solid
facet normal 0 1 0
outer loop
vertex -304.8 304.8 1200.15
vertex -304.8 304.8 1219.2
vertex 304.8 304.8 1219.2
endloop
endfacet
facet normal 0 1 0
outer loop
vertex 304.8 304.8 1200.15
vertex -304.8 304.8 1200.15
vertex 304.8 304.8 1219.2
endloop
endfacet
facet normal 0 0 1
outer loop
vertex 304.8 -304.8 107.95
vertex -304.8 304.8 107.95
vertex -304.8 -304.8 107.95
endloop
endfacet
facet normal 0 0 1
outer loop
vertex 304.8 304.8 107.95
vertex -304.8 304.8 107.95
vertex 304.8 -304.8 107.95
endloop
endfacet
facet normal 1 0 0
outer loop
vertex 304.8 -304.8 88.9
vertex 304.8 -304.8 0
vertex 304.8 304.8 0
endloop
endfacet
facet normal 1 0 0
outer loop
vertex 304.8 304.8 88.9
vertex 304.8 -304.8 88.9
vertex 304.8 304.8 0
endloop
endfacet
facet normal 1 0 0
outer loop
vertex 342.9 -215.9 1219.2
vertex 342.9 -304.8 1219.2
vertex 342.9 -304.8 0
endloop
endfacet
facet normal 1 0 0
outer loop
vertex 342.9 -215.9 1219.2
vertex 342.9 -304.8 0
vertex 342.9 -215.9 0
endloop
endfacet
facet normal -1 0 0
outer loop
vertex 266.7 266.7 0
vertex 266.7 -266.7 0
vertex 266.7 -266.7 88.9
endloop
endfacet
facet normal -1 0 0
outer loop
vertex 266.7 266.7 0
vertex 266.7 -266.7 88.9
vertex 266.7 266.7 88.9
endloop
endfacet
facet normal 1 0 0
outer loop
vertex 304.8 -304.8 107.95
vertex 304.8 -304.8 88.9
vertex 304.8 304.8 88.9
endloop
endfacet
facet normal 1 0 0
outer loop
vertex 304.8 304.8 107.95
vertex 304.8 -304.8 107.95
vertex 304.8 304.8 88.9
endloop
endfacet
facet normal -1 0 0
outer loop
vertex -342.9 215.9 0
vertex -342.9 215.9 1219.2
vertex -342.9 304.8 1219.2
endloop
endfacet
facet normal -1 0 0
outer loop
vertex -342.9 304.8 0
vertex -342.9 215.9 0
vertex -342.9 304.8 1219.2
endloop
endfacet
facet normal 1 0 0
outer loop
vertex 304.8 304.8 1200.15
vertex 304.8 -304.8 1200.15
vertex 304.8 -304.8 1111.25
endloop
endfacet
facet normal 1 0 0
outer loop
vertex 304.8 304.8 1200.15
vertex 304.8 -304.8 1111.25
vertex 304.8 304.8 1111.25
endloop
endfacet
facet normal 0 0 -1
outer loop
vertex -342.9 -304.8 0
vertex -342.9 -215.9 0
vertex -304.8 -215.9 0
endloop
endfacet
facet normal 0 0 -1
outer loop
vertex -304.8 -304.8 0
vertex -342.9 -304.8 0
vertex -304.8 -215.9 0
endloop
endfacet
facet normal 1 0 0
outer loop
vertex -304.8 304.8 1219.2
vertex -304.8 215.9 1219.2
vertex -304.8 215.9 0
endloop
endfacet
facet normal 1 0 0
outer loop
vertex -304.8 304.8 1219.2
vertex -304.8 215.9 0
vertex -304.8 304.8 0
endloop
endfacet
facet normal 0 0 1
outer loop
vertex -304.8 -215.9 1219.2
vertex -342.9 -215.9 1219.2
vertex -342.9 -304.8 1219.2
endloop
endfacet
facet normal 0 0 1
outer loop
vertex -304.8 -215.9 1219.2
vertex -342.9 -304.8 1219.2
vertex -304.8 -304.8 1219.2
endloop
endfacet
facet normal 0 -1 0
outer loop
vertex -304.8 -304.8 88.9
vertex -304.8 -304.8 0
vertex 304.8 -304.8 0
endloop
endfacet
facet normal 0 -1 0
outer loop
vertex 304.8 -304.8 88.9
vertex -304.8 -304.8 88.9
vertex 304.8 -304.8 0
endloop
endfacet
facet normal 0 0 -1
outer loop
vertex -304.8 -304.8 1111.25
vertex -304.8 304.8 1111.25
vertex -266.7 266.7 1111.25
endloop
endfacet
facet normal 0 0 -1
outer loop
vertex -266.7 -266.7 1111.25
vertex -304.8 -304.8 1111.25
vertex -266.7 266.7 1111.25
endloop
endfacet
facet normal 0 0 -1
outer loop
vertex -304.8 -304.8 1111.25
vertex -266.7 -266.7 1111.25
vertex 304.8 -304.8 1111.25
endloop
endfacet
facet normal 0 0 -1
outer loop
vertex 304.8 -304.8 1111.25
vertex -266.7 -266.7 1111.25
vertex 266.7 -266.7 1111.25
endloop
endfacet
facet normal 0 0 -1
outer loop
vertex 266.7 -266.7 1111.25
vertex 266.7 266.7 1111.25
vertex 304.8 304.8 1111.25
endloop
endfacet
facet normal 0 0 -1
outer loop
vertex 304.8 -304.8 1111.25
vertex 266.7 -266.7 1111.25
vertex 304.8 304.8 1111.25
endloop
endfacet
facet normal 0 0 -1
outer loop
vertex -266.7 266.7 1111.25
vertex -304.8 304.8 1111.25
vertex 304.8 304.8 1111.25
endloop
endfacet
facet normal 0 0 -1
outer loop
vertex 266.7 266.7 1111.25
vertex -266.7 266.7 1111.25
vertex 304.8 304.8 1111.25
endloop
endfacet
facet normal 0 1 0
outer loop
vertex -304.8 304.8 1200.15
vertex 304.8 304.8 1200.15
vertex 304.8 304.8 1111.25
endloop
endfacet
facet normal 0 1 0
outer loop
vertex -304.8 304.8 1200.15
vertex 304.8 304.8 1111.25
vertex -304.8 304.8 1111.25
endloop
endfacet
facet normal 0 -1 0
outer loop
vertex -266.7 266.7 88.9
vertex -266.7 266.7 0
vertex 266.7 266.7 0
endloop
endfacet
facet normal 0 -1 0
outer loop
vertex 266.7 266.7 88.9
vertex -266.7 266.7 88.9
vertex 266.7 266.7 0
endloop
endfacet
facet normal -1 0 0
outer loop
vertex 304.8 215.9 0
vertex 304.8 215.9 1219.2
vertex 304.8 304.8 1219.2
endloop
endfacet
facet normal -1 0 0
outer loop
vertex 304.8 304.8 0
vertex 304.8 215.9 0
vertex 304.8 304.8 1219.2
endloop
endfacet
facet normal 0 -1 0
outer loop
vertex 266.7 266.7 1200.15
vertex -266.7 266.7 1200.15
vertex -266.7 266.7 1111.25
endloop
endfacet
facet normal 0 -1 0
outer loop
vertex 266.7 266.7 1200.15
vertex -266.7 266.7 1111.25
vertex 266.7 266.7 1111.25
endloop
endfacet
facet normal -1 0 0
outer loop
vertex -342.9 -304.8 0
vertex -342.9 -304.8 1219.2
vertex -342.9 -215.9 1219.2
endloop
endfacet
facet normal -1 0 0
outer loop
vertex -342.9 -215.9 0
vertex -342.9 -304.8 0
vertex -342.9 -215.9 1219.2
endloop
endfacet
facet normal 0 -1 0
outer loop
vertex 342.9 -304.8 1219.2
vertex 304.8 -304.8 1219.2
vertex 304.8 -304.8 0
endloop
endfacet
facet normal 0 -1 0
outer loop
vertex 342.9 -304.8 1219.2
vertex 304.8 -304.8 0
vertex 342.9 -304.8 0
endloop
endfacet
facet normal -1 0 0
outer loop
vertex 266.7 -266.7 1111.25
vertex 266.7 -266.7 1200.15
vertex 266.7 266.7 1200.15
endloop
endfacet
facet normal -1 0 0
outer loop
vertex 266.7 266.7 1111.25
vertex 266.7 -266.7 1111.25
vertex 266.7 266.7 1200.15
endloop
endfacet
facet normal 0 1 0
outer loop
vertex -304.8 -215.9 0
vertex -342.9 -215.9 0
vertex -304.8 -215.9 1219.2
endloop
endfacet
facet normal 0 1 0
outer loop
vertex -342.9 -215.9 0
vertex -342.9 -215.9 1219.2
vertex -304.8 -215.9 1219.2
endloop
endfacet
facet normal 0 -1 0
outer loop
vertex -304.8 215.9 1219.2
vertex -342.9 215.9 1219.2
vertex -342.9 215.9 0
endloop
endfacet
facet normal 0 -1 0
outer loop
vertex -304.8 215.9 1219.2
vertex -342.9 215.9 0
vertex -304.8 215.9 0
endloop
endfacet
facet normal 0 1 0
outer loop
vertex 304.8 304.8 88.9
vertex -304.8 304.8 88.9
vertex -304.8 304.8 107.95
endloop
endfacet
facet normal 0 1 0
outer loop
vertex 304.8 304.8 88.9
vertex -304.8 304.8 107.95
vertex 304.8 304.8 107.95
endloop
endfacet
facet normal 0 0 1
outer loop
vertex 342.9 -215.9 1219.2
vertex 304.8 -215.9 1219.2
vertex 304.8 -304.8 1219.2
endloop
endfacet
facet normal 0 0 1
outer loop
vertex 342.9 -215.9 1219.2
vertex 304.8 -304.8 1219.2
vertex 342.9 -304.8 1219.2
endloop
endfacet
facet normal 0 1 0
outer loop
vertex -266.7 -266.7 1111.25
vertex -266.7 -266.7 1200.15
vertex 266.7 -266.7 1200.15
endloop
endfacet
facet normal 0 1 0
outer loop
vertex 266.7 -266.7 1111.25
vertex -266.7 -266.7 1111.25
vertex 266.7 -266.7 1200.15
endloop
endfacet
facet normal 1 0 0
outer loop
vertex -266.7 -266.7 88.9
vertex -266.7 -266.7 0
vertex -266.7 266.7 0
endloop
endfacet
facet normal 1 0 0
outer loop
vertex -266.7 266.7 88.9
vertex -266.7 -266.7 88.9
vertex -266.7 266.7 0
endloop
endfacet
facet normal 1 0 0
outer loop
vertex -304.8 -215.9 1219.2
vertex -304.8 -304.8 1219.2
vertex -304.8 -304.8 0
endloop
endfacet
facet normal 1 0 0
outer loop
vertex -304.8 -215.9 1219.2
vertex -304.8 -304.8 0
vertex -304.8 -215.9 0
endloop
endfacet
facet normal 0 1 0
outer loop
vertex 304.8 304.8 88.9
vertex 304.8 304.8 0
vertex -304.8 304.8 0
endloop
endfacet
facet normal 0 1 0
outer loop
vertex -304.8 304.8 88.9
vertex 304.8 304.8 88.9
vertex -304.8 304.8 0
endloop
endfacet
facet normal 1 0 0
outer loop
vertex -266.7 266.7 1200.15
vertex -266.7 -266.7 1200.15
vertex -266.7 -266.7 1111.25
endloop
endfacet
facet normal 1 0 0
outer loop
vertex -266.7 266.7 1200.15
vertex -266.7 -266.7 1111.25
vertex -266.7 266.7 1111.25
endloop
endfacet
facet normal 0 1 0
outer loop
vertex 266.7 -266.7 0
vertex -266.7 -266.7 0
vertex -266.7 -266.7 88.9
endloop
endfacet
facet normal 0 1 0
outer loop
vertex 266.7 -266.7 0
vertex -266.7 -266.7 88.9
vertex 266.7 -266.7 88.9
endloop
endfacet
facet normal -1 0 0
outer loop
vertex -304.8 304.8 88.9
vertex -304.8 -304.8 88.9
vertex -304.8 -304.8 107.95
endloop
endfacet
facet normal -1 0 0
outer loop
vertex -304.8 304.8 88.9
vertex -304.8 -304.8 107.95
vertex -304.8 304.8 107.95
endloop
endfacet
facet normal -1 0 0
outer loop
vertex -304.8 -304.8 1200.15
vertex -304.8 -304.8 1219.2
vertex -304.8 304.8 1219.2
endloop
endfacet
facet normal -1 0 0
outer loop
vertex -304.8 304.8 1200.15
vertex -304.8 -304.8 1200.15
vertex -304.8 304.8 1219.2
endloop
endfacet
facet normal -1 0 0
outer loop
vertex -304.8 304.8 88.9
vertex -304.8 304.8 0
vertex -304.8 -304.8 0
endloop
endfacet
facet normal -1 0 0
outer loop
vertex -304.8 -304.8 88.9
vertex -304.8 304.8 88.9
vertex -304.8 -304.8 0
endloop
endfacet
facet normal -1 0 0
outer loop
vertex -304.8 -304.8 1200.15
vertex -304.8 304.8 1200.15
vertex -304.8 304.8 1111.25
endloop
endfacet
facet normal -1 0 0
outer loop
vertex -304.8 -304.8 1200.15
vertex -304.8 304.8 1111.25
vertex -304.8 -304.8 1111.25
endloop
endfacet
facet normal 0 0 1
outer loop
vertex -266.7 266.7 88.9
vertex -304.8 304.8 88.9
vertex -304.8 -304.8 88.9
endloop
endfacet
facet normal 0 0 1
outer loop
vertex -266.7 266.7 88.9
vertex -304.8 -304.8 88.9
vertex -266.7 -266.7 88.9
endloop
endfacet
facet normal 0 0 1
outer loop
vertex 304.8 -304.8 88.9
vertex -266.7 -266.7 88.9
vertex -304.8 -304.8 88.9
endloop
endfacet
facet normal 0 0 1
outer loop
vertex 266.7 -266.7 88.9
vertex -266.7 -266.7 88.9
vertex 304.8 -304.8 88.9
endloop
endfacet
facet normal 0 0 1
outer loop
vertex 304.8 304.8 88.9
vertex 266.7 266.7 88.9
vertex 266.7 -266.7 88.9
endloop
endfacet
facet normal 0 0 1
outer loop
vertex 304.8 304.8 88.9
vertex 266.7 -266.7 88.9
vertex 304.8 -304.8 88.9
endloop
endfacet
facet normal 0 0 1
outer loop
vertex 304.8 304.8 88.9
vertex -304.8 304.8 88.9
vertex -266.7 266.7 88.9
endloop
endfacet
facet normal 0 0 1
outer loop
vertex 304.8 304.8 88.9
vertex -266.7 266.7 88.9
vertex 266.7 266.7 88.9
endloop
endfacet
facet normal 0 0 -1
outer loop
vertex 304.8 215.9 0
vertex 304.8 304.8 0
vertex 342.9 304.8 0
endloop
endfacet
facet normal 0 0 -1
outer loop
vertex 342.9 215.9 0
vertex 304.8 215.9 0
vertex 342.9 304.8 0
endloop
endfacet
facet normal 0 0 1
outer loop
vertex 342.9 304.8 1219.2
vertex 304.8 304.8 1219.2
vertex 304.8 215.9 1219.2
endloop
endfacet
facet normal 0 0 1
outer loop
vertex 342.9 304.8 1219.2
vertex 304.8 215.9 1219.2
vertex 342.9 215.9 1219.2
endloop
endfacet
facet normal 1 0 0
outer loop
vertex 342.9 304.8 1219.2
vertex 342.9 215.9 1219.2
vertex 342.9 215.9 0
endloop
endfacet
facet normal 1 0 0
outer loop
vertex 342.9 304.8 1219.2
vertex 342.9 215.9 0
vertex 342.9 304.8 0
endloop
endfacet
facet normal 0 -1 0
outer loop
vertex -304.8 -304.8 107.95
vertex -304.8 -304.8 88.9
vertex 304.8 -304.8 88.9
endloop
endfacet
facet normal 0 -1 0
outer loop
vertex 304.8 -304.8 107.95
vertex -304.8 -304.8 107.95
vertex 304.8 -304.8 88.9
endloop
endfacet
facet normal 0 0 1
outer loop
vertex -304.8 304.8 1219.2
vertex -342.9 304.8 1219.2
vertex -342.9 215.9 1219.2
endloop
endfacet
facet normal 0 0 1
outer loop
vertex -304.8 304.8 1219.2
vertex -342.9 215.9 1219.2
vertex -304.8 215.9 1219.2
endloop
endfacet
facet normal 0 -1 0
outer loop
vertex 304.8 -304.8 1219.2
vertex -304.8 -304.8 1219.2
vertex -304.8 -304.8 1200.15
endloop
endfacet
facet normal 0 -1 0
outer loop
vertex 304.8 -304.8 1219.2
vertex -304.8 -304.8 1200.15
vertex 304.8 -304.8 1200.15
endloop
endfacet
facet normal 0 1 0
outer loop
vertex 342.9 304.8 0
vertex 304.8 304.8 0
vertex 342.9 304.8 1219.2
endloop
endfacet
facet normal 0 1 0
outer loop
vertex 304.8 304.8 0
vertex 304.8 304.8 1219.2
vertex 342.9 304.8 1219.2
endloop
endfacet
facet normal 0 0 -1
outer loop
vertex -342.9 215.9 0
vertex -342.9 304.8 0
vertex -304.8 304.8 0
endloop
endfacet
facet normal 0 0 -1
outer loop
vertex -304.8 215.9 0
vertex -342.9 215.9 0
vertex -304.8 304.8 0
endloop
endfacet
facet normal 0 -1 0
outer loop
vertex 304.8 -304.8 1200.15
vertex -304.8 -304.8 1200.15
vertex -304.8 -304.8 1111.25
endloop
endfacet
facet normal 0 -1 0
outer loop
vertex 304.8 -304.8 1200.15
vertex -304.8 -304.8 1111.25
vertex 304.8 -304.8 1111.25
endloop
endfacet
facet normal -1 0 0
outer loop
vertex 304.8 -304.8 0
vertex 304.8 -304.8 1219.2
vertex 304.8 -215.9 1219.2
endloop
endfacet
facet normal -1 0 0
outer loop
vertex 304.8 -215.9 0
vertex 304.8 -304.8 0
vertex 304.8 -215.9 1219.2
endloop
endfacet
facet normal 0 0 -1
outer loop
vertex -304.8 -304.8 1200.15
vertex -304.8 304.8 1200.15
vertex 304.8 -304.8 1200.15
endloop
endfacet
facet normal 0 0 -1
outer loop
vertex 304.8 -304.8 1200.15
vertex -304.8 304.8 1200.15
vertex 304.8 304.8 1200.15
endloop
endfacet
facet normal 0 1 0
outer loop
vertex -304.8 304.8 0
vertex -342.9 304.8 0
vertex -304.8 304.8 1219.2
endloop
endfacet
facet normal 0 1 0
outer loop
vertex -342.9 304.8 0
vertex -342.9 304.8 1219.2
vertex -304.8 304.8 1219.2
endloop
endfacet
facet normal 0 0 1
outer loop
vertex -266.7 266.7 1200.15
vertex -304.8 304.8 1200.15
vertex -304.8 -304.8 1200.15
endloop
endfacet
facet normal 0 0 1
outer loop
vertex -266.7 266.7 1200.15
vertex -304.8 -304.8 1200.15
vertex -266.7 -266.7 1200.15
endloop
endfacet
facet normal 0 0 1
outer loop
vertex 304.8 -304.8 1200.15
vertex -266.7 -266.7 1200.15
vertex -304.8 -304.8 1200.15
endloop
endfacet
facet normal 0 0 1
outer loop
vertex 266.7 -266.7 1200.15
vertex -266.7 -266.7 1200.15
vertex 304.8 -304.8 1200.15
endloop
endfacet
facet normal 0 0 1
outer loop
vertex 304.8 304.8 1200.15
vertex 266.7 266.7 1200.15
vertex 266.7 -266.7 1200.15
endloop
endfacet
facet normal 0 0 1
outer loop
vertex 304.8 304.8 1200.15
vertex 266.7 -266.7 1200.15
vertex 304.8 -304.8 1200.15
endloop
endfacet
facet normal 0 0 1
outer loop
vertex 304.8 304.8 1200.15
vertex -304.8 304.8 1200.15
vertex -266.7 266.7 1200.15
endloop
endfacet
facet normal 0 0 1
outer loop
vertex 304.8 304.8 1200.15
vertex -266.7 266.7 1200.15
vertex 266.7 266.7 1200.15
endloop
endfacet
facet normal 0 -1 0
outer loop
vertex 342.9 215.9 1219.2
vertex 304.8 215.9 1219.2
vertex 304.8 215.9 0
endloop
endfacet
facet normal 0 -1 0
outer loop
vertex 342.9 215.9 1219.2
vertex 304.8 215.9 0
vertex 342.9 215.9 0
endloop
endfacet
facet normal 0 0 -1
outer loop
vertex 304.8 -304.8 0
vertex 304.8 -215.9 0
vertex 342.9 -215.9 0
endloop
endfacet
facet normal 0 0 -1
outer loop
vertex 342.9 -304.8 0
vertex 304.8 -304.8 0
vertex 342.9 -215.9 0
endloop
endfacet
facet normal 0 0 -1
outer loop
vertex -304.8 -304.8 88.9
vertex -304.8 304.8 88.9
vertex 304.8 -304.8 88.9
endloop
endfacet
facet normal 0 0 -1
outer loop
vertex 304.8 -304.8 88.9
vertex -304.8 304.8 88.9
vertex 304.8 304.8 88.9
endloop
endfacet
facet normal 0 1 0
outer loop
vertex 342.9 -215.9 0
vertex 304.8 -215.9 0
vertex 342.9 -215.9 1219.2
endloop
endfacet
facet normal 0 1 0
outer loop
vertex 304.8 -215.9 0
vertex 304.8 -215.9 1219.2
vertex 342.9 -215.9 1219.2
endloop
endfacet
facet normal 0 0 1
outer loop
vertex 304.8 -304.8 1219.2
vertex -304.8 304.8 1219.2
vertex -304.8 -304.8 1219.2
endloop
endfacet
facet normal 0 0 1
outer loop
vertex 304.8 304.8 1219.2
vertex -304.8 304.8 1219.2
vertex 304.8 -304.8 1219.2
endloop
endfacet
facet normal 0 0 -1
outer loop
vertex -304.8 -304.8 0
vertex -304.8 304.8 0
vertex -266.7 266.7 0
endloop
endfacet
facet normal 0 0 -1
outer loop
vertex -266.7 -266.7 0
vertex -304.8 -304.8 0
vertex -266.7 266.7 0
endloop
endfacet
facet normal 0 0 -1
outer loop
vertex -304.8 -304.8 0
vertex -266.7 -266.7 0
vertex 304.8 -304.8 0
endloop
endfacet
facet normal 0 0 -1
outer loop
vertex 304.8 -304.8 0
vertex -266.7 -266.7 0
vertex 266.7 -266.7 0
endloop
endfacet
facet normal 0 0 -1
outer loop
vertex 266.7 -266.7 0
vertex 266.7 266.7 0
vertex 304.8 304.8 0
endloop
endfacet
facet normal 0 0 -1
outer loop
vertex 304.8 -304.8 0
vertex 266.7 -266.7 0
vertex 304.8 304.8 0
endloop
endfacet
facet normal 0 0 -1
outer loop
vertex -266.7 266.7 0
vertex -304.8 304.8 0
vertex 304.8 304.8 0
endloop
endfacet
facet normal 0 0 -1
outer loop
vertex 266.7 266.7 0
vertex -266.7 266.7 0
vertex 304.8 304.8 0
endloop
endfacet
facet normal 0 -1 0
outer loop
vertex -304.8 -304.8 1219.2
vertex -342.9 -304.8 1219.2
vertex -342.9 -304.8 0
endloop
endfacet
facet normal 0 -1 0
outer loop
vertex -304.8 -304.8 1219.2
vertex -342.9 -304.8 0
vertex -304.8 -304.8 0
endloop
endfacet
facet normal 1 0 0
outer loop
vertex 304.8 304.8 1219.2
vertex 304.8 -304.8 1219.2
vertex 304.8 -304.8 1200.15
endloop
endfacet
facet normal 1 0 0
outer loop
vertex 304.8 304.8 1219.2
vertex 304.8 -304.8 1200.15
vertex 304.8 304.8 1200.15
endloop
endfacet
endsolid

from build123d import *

# Parameters (mm, degrees)
F0_W          = 533.4
F0_H          = 533.4
F1_DEPTH      = 88.9
F2_W          = 38.1
F2_H          = 88.9
F3_DEPTH      = 1130.3
F3_DEPTH_BACK = 88.9
F4_W          = 609.6
F4_H          = 609.6
F5_DEPTH      = 19.05


# Not quite as in the source:
# - a feature of the source that left no trace in its solid (it failed there, or was rolled back) is left out
# - a pattern or mirror of a feature is missing from the dataset's text; its kind, count and spacing are read off the source's solid


with BuildPart() as f1:
    # F0 (on Top) → F1 (new body)
    with BuildSketch(Plane.XY):
        Polygon((-279.4, 304.8), (-304.8, 304.8), (-304.8, 215.9), (-304.8, -215.9), (-304.8, -304.8), (-279.4, -304.8), (304.8, -304.8), (304.8, -266.7), (304.8, -215.9), (304.8, 215.9), (304.8, 304.8), (-266.7, 304.8), align=None)
        Rectangle(F0_W, F0_H, mode=Mode.SUBTRACT)
    extrude(amount=F1_DEPTH)


with BuildPart() as f1_copies_1:
    # F1_copies: instance of F1
    add(f1.part.mirror(Plane.XY.offset(600.075)))


with BuildPart() as f3:
    # F2 (on face) → F3 (new body, two sides)
    with BuildSketch(Plane.XY.offset(88.9)) as f3_sk:
        with Locations((-323.85, 260.35)):
            Rectangle(F2_W, F2_H)
    extrude(amount=F3_DEPTH)
    extrude(f3_sk.sketch, amount=-F3_DEPTH_BACK)


with BuildPart() as f3b:
    # F2 (on face) → F3, piece 2 (new body, two sides)
    with BuildSketch(Plane.XY.offset(88.9)) as f3_2_sk:
        with Locations((323.85, 260.35)):
            Rectangle(F2_W, F2_H)
    extrude(amount=F3_DEPTH)
    extrude(f3_2_sk.sketch, amount=-F3_DEPTH_BACK)


with BuildPart() as f3c:
    # F2 (on face) → F3, piece 3 (new body, two sides)
    with BuildSketch(Plane.XY.offset(88.9)) as f3_3_sk:
        with Locations((323.85, -260.35)):
            Rectangle(F2_W, F2_H)
    extrude(amount=F3_DEPTH)
    extrude(f3_3_sk.sketch, amount=-F3_DEPTH_BACK)


with BuildPart() as f3d:
    # F2 (on face) → F3, piece 4 (new body, two sides)
    with BuildSketch(Plane.XY.offset(88.9)) as f3_4_sk:
        with Locations((-323.85, -260.35)):
            Rectangle(F2_W, F2_H)
    extrude(amount=F3_DEPTH)
    extrude(f3_4_sk.sketch, amount=-F3_DEPTH_BACK)


with BuildPart() as f5:
    # F4 (on face) → F5 (new body)
    with BuildSketch(Plane.XY.offset(88.9)):
        Rectangle(F4_W, F4_H)
    extrude(amount=F5_DEPTH)


with BuildPart() as f5_copies_1:
    # F5_copies: instance of F5
    add(f5.part.mirror(Plane.XY.offset(654.05)))


solid = Compound([f1.part, f1_copies_1.part, f3.part, f3b.part, f3c.part, f3d.part, f5.part, f5_copies_1.part])
